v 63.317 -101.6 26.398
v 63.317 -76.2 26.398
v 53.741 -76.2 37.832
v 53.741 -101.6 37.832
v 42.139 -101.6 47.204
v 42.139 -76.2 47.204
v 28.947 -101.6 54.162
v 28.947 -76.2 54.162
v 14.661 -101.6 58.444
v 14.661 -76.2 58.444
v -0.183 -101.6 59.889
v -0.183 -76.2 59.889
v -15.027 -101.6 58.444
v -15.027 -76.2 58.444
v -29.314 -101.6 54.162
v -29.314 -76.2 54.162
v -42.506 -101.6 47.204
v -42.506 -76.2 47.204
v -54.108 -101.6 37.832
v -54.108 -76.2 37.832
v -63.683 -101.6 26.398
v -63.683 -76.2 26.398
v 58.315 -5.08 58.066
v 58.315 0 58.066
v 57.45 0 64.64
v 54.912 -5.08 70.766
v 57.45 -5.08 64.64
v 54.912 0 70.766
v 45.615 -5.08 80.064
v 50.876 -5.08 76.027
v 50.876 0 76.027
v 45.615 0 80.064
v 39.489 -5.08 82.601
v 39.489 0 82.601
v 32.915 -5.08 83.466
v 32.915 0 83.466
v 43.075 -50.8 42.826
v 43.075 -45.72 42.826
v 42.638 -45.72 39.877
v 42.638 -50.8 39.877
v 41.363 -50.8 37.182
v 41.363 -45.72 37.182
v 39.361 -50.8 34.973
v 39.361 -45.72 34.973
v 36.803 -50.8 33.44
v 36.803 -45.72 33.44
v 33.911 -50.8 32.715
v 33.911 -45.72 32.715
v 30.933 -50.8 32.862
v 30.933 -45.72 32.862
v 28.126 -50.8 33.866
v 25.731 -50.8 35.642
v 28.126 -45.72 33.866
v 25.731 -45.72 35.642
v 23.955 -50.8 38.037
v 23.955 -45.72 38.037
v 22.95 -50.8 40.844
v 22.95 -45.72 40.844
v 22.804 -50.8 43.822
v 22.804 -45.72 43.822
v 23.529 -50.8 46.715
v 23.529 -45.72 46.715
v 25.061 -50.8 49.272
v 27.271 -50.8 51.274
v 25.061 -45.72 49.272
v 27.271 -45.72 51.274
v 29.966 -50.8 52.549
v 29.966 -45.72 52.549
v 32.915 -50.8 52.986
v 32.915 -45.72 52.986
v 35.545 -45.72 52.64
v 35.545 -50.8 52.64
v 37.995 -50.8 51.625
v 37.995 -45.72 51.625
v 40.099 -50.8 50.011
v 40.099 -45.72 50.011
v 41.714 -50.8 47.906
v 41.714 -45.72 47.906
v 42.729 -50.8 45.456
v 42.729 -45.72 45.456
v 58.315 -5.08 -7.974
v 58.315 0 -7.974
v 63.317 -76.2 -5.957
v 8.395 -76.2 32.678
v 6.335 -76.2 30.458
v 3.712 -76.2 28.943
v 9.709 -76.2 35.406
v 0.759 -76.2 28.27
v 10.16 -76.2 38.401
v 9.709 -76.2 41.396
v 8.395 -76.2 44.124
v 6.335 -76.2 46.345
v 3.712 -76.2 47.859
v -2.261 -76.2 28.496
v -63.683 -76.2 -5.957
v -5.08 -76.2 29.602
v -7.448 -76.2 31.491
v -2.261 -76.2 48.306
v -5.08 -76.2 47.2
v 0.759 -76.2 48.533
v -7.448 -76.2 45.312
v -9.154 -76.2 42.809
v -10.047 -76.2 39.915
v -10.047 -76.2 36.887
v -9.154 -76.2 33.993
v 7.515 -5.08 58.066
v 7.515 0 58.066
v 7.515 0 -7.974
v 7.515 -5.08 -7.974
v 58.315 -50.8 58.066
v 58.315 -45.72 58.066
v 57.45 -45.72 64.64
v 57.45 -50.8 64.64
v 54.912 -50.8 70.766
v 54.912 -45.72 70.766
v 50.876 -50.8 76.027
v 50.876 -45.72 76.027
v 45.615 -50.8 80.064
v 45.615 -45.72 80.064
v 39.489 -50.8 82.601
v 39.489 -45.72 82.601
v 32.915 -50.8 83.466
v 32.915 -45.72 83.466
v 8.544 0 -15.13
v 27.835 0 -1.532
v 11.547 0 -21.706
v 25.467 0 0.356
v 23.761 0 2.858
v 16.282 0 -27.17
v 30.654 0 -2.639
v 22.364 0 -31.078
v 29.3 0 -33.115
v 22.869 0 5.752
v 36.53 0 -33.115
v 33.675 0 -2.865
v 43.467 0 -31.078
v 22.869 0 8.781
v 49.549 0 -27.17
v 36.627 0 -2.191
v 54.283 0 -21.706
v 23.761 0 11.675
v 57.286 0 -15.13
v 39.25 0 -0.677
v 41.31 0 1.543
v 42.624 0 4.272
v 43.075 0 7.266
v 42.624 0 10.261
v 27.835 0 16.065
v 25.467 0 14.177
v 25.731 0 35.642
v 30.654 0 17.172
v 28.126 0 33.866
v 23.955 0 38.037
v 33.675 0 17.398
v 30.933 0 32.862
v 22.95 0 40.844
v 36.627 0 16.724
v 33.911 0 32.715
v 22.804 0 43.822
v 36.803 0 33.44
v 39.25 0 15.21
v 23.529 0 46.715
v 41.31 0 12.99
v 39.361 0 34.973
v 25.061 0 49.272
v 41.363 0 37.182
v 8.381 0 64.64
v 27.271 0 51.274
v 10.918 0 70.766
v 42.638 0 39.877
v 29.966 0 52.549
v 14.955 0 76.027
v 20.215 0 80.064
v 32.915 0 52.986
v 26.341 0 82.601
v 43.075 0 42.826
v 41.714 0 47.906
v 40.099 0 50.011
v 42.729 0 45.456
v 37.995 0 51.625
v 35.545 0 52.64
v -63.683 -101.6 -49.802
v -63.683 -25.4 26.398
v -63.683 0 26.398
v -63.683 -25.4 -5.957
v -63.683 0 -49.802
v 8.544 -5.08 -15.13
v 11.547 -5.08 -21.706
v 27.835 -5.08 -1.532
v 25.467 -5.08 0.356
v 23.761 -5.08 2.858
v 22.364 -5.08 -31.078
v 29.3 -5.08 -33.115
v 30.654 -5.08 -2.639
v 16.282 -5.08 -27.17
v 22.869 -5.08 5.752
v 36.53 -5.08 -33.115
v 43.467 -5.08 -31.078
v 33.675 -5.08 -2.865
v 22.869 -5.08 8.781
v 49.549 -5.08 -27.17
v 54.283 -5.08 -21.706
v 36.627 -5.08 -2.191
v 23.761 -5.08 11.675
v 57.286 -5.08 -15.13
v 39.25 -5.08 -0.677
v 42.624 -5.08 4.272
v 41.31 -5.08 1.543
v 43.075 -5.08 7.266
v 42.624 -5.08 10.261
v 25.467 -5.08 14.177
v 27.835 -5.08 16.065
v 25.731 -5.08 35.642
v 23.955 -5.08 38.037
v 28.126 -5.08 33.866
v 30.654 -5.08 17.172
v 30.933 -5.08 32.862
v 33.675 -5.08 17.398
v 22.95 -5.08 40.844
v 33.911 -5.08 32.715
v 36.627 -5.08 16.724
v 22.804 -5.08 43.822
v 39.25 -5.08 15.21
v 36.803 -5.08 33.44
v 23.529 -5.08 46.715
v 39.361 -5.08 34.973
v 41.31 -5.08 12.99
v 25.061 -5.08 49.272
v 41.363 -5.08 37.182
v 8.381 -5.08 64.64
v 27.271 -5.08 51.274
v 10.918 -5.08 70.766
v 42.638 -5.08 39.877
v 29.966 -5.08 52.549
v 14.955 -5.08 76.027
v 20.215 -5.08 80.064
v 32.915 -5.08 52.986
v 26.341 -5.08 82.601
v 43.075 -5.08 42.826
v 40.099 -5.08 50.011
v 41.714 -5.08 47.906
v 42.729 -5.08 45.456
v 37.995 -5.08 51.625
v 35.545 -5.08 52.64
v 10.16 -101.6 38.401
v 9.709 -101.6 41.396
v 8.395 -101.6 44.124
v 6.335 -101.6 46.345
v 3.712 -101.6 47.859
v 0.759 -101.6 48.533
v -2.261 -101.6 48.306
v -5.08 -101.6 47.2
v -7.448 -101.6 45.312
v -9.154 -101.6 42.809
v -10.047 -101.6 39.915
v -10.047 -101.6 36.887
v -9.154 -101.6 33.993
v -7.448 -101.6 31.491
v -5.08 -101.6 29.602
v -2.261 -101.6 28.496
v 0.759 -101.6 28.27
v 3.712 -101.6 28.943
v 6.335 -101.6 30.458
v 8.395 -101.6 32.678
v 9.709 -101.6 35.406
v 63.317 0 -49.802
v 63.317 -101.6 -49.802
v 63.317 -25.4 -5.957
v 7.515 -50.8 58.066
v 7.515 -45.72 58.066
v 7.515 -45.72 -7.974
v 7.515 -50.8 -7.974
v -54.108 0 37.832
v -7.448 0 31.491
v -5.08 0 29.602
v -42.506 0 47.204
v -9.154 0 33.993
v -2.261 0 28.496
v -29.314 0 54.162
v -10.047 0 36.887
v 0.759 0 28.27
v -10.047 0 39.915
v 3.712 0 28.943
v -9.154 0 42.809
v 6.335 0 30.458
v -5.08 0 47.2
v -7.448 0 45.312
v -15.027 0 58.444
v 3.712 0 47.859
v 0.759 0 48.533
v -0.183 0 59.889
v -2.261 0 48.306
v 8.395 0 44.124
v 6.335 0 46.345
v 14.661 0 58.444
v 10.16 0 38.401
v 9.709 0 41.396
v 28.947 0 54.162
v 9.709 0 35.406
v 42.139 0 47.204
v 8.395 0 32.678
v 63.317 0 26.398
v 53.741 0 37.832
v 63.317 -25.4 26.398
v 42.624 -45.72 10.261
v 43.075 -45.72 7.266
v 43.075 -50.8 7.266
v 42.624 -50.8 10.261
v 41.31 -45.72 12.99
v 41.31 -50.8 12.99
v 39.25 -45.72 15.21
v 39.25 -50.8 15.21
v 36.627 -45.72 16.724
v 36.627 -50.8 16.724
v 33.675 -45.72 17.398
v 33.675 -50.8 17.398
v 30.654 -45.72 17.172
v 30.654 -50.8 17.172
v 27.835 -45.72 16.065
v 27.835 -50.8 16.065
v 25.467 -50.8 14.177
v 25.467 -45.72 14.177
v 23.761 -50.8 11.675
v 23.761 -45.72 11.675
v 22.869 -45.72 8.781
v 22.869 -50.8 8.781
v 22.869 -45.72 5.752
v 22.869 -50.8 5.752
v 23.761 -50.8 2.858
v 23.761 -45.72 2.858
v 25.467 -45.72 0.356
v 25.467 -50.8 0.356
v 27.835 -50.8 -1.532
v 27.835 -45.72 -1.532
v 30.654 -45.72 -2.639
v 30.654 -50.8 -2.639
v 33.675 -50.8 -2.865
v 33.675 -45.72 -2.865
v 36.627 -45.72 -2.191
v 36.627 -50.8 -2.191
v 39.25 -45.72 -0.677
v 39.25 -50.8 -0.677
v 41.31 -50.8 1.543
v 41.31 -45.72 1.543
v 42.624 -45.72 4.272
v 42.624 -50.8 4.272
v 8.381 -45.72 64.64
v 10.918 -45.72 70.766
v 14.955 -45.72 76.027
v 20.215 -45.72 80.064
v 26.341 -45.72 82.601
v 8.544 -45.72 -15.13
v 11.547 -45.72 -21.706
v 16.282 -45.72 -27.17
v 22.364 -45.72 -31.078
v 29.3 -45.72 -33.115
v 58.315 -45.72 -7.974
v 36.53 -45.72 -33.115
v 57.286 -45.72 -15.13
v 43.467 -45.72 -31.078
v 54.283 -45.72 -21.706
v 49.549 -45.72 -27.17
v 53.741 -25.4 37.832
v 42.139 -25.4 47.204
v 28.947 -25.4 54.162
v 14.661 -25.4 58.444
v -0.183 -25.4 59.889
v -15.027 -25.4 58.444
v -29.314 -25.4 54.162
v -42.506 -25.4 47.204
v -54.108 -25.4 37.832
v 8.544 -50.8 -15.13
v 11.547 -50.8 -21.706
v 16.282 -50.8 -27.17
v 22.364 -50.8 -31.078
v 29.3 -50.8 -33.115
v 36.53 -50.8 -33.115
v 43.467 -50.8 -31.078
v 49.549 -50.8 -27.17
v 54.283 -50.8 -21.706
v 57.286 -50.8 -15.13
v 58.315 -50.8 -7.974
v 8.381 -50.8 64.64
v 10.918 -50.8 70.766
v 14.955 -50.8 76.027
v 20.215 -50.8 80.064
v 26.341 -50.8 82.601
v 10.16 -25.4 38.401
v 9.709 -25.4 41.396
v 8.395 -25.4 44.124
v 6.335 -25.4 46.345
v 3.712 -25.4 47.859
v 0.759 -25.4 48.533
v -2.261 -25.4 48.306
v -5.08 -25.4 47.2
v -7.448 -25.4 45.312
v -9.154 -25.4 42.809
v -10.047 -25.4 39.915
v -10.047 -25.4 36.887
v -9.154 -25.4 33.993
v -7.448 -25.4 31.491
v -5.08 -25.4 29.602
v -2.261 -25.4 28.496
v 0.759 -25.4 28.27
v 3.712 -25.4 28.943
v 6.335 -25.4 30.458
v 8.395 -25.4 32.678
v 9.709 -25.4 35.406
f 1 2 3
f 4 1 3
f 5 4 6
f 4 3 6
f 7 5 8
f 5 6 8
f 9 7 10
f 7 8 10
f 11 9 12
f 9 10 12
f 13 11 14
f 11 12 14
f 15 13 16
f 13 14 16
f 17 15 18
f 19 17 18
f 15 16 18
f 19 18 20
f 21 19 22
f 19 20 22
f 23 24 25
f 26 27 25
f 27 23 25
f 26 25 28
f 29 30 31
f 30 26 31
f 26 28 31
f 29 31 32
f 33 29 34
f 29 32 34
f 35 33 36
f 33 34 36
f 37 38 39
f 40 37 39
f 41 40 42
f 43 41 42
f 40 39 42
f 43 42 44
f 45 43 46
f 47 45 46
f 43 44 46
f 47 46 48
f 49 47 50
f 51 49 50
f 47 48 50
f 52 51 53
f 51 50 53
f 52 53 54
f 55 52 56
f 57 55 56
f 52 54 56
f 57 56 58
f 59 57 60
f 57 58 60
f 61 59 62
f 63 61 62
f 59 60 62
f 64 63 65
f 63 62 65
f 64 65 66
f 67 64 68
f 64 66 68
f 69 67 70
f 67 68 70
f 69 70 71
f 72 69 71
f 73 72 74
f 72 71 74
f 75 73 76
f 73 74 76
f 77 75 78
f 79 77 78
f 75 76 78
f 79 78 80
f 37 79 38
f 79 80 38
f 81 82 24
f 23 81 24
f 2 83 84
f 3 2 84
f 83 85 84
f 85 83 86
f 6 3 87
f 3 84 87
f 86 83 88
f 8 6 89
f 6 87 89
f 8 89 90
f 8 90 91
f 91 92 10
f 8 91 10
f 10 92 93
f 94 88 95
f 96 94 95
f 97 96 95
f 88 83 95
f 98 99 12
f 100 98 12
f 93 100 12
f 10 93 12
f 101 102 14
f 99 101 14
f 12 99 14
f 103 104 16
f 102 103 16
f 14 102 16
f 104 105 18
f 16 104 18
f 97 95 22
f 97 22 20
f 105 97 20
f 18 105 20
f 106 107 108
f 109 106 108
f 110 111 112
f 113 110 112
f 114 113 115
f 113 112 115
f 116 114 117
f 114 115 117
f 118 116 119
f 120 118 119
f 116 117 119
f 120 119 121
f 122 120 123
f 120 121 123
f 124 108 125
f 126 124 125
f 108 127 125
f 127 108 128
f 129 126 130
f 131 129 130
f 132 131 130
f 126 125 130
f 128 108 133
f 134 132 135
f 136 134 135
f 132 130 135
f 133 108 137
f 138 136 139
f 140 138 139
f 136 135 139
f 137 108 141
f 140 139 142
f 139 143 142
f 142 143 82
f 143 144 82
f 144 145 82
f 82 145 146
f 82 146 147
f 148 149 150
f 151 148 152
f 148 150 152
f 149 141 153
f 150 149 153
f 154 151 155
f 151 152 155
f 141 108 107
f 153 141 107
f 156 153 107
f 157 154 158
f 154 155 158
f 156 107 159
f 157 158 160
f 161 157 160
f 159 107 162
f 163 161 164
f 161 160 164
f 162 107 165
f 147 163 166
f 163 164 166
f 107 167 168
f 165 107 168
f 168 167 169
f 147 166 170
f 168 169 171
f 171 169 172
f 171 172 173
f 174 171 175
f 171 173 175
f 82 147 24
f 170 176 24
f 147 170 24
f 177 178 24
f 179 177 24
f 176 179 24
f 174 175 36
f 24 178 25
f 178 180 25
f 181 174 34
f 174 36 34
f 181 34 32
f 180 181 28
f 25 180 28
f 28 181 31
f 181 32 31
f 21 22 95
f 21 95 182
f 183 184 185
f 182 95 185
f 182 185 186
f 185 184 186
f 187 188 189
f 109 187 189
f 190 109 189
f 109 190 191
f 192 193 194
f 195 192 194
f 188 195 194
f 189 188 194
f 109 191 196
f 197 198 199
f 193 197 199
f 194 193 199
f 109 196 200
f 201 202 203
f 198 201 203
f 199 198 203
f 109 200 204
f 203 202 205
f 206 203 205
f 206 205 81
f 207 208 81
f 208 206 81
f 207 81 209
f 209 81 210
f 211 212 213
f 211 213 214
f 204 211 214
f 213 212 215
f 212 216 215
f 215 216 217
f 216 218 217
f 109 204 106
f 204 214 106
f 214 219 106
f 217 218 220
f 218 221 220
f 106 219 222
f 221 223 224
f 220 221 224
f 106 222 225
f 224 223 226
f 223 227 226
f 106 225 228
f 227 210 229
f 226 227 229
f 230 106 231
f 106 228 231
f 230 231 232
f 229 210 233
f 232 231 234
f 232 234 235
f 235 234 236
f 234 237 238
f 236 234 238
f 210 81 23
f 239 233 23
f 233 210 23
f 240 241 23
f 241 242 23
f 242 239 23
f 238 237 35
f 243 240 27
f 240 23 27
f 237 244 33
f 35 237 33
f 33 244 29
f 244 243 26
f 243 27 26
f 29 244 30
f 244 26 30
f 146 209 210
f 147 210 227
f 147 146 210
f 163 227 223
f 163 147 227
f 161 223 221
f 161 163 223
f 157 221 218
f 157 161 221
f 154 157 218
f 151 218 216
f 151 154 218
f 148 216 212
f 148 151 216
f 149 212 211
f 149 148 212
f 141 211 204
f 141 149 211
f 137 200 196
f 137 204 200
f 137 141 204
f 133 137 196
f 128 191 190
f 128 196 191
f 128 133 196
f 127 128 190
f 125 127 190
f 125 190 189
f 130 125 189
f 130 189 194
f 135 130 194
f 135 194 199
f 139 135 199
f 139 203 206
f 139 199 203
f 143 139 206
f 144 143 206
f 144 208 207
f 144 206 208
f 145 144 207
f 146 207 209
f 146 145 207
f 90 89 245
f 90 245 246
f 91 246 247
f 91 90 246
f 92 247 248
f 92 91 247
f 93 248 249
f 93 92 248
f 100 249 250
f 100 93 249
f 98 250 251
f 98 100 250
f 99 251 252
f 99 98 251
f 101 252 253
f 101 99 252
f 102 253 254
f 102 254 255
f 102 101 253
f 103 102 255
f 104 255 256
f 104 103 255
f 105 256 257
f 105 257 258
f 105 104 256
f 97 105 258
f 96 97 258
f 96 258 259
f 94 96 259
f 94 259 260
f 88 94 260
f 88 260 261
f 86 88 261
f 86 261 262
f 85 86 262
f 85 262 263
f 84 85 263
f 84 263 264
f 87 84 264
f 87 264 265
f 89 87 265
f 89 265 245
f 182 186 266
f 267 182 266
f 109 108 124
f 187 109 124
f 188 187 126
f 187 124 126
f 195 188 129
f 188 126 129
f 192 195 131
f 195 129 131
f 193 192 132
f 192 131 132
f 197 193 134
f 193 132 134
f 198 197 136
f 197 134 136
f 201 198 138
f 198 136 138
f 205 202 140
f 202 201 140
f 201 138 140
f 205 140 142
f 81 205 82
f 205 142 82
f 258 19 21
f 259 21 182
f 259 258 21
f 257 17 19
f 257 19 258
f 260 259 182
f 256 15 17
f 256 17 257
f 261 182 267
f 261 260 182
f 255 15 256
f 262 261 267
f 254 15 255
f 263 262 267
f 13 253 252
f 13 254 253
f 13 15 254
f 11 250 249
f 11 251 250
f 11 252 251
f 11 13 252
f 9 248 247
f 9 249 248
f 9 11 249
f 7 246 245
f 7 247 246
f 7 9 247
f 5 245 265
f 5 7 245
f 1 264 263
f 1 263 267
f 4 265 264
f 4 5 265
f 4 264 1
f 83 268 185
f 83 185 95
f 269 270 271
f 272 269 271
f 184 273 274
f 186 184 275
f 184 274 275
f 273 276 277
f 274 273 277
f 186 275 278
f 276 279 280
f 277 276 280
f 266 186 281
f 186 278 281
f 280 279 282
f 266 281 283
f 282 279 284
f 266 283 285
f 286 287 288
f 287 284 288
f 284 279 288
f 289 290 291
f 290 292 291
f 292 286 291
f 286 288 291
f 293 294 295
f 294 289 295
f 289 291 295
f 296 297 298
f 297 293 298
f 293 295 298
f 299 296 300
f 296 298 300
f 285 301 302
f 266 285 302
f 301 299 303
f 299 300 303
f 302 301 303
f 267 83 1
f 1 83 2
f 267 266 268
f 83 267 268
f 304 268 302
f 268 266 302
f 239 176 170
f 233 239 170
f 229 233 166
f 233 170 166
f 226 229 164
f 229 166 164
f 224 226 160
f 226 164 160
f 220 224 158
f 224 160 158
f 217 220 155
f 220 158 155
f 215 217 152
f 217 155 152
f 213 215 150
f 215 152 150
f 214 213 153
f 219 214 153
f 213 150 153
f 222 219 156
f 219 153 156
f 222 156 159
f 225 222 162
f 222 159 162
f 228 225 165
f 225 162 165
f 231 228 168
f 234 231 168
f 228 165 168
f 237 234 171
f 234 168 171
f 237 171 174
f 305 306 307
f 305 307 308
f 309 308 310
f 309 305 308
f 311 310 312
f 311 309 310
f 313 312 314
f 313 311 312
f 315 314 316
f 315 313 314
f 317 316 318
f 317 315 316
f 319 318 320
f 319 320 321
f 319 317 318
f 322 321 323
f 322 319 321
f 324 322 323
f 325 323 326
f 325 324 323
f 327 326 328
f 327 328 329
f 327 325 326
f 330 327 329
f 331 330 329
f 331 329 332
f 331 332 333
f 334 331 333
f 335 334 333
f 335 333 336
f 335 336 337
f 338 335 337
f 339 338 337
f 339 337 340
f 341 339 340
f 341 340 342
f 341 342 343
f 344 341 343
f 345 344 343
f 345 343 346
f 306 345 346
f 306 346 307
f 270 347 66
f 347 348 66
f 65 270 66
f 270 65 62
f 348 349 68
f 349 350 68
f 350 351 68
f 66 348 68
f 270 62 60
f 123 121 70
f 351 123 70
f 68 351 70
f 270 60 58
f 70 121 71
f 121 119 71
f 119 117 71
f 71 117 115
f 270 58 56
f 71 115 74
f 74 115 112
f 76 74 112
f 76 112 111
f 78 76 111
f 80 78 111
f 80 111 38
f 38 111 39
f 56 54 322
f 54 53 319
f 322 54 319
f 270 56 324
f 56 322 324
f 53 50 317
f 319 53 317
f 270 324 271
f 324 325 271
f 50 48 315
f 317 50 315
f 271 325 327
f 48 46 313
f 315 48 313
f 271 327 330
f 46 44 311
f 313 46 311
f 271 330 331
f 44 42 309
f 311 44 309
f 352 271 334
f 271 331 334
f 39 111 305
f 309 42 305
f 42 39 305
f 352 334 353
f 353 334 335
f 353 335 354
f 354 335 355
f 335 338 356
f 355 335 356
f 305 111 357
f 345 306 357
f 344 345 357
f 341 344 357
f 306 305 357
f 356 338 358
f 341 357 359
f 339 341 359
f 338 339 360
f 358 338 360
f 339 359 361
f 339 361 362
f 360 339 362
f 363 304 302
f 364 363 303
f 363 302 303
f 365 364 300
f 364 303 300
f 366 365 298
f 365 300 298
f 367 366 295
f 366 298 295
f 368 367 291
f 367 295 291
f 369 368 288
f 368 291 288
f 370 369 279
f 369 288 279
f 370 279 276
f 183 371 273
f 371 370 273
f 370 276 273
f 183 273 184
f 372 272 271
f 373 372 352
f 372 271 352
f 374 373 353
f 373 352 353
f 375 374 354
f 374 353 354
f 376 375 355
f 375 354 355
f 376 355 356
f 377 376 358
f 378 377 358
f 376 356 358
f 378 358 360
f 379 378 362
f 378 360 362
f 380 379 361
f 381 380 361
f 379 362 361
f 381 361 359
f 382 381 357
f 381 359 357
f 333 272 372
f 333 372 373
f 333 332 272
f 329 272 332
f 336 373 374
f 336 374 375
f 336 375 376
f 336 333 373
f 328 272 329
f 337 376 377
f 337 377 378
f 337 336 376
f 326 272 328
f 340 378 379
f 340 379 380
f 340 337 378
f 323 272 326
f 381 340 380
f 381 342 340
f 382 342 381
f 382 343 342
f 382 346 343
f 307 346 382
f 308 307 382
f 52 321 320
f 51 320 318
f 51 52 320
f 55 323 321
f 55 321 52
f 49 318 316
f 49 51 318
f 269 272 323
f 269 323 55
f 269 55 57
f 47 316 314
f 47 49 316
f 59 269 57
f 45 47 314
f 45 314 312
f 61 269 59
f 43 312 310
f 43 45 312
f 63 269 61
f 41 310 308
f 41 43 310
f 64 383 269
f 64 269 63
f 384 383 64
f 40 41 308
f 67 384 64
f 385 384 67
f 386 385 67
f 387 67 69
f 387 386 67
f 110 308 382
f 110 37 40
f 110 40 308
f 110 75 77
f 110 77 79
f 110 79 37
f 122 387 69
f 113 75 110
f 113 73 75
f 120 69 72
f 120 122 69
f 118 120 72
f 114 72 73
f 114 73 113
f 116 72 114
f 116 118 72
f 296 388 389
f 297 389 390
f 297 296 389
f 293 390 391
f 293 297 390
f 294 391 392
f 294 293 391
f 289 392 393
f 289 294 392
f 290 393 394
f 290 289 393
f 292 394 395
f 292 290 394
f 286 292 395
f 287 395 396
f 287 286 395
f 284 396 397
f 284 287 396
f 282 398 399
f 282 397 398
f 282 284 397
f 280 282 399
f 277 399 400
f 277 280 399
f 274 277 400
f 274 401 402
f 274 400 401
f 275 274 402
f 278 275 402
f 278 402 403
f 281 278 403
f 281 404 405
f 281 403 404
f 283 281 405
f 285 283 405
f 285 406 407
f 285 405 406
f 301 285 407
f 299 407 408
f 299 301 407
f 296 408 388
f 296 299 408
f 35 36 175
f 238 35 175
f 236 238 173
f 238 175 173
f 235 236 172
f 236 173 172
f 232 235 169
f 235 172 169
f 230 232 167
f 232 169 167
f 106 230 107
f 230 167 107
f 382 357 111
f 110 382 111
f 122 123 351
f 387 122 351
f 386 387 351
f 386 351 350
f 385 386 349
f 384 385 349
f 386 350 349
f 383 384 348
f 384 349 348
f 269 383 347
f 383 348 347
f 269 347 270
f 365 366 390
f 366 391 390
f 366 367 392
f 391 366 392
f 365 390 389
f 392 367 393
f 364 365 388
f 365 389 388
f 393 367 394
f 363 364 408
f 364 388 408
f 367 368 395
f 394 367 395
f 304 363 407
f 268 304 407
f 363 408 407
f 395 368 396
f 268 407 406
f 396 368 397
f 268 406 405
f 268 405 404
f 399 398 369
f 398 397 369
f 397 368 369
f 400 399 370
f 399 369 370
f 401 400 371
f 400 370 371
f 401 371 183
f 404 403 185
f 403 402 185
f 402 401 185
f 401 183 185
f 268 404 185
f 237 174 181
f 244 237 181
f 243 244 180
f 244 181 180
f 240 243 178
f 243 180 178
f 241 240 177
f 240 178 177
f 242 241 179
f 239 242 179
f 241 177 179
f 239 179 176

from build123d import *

# Parameters (mm, degrees)
F0_R     = 10.16
F1_DEPTH = 101.6
F2_W     = 50.8
F2_H     = 32.354841419
F2_H_2   = 44.4474281366
F3_DEPTH = 254
F4_R     = 10.16
F5_DEPTH = 50.8
F6_W     = 40.64
F6_H     = 34.1181978053
F6_H_2   = 66.04
F6_H_3   = 31.4270798117
F7_DEPTH = 76.2


with BuildPart() as f1:
    # F0 (on Front) → F1 (new body)
    with BuildSketch(Plane.XZ):
        with BuildLine():
            Line((-63.6832991838, 26.3976244633), (-63.6832991838, -49.8023755367))
            Line((-63.6832991838, -49.8023755367), (63.3167008162, -49.8023755367))
            Line((63.3167008162, -49.8023755367), (63.3167008162, 26.3976244633))
            ThreePointArc((63.3167008162, 26.3976244633), (-0.1832991838, 59.8891982699), (-63.6832991838, 26.3976244633))
        make_face()
        with Locations((0, 38.4011343122)):
            Circle(F0_R, mode=Mode.SUBTRACT)
    extrude(amount=F1_DEPTH)

    # F2 (on face) → F3 (cut)
    with BuildSketch(Plane(origin=(-63.6832991838, 0, 0), x_dir=(0, -1, 0), z_dir=(-1, 0, 0))):
        with Locations((50.8, 10.2202037538)):
            Rectangle(F2_W, F2_H)
        with Locations((50.8, 48.6213385316)):
            Rectangle(F2_W, F2_H_2)
    extrude(amount=-F3_DEPTH, mode=Mode.SUBTRACT)


with BuildPart() as f5:
    # F4 (on Front) → F5 (new body)
    with BuildSketch(Plane.XZ):
        with BuildLine():
            ThreePointArc((58.3152576901, 58.0664948159), (50.8757699322, 76.0270070581), (32.9152576901, 83.4664948159))
            ThreePointArc((32.9152576901, 83.4664948159), (14.954745448, 76.0270070581), (7.5152576901, 58.0664948159))
            Line((7.5152576901, 58.0664948159), (7.5152576901, 42.8264948159))
            Line((7.5152576901, 42.8264948159), (7.5152576901, -7.9735051841))
            ThreePointArc((7.5152576901, -7.9735051841), (32.9152576901, -33.3735051841), (58.3152576901, -7.9735051841))
            Line((58.3152576901, -7.9735051841), (58.3152576901, 42.8264948159))
            Line((58.3152576901, 42.8264948159), (58.3152576901, 58.0664948159))
        make_face()
        with Locations((32.9152576901, 7.2664948159)):
            Circle(F4_R, mode=Mode.SUBTRACT)
        with BuildLine():
            ThreePointArc((32.9152576901, 52.9864948159), (40.099462587, 50.0106997128), (43.0752576901, 42.8264948159))
            ThreePointArc((43.0752576901, 42.8264948159), (25.7310527932, 35.6422899191), (32.9152576901, 52.9864948159))
        make_face(mode=Mode.SUBTRACT)
    extrude(amount=F5_DEPTH)

    # F6 (on face) → F7 (cut)
    with BuildSketch(Plane.YZ.offset(58.3152576901)):
        with Locations((-25.4, 75.1255937186)):
            Rectangle(F6_W, F6_H)
        with Locations((-25.4, 25.0464948159)):
            Rectangle(F6_W, F6_H_2)
        with Locations((-25.4, -23.6870450899)):
            Rectangle(F6_W, F6_H_3)
    extrude(amount=-F7_DEPTH, mode=Mode.SUBTRACT)


solid = Compound([f1.part, f5.part])
